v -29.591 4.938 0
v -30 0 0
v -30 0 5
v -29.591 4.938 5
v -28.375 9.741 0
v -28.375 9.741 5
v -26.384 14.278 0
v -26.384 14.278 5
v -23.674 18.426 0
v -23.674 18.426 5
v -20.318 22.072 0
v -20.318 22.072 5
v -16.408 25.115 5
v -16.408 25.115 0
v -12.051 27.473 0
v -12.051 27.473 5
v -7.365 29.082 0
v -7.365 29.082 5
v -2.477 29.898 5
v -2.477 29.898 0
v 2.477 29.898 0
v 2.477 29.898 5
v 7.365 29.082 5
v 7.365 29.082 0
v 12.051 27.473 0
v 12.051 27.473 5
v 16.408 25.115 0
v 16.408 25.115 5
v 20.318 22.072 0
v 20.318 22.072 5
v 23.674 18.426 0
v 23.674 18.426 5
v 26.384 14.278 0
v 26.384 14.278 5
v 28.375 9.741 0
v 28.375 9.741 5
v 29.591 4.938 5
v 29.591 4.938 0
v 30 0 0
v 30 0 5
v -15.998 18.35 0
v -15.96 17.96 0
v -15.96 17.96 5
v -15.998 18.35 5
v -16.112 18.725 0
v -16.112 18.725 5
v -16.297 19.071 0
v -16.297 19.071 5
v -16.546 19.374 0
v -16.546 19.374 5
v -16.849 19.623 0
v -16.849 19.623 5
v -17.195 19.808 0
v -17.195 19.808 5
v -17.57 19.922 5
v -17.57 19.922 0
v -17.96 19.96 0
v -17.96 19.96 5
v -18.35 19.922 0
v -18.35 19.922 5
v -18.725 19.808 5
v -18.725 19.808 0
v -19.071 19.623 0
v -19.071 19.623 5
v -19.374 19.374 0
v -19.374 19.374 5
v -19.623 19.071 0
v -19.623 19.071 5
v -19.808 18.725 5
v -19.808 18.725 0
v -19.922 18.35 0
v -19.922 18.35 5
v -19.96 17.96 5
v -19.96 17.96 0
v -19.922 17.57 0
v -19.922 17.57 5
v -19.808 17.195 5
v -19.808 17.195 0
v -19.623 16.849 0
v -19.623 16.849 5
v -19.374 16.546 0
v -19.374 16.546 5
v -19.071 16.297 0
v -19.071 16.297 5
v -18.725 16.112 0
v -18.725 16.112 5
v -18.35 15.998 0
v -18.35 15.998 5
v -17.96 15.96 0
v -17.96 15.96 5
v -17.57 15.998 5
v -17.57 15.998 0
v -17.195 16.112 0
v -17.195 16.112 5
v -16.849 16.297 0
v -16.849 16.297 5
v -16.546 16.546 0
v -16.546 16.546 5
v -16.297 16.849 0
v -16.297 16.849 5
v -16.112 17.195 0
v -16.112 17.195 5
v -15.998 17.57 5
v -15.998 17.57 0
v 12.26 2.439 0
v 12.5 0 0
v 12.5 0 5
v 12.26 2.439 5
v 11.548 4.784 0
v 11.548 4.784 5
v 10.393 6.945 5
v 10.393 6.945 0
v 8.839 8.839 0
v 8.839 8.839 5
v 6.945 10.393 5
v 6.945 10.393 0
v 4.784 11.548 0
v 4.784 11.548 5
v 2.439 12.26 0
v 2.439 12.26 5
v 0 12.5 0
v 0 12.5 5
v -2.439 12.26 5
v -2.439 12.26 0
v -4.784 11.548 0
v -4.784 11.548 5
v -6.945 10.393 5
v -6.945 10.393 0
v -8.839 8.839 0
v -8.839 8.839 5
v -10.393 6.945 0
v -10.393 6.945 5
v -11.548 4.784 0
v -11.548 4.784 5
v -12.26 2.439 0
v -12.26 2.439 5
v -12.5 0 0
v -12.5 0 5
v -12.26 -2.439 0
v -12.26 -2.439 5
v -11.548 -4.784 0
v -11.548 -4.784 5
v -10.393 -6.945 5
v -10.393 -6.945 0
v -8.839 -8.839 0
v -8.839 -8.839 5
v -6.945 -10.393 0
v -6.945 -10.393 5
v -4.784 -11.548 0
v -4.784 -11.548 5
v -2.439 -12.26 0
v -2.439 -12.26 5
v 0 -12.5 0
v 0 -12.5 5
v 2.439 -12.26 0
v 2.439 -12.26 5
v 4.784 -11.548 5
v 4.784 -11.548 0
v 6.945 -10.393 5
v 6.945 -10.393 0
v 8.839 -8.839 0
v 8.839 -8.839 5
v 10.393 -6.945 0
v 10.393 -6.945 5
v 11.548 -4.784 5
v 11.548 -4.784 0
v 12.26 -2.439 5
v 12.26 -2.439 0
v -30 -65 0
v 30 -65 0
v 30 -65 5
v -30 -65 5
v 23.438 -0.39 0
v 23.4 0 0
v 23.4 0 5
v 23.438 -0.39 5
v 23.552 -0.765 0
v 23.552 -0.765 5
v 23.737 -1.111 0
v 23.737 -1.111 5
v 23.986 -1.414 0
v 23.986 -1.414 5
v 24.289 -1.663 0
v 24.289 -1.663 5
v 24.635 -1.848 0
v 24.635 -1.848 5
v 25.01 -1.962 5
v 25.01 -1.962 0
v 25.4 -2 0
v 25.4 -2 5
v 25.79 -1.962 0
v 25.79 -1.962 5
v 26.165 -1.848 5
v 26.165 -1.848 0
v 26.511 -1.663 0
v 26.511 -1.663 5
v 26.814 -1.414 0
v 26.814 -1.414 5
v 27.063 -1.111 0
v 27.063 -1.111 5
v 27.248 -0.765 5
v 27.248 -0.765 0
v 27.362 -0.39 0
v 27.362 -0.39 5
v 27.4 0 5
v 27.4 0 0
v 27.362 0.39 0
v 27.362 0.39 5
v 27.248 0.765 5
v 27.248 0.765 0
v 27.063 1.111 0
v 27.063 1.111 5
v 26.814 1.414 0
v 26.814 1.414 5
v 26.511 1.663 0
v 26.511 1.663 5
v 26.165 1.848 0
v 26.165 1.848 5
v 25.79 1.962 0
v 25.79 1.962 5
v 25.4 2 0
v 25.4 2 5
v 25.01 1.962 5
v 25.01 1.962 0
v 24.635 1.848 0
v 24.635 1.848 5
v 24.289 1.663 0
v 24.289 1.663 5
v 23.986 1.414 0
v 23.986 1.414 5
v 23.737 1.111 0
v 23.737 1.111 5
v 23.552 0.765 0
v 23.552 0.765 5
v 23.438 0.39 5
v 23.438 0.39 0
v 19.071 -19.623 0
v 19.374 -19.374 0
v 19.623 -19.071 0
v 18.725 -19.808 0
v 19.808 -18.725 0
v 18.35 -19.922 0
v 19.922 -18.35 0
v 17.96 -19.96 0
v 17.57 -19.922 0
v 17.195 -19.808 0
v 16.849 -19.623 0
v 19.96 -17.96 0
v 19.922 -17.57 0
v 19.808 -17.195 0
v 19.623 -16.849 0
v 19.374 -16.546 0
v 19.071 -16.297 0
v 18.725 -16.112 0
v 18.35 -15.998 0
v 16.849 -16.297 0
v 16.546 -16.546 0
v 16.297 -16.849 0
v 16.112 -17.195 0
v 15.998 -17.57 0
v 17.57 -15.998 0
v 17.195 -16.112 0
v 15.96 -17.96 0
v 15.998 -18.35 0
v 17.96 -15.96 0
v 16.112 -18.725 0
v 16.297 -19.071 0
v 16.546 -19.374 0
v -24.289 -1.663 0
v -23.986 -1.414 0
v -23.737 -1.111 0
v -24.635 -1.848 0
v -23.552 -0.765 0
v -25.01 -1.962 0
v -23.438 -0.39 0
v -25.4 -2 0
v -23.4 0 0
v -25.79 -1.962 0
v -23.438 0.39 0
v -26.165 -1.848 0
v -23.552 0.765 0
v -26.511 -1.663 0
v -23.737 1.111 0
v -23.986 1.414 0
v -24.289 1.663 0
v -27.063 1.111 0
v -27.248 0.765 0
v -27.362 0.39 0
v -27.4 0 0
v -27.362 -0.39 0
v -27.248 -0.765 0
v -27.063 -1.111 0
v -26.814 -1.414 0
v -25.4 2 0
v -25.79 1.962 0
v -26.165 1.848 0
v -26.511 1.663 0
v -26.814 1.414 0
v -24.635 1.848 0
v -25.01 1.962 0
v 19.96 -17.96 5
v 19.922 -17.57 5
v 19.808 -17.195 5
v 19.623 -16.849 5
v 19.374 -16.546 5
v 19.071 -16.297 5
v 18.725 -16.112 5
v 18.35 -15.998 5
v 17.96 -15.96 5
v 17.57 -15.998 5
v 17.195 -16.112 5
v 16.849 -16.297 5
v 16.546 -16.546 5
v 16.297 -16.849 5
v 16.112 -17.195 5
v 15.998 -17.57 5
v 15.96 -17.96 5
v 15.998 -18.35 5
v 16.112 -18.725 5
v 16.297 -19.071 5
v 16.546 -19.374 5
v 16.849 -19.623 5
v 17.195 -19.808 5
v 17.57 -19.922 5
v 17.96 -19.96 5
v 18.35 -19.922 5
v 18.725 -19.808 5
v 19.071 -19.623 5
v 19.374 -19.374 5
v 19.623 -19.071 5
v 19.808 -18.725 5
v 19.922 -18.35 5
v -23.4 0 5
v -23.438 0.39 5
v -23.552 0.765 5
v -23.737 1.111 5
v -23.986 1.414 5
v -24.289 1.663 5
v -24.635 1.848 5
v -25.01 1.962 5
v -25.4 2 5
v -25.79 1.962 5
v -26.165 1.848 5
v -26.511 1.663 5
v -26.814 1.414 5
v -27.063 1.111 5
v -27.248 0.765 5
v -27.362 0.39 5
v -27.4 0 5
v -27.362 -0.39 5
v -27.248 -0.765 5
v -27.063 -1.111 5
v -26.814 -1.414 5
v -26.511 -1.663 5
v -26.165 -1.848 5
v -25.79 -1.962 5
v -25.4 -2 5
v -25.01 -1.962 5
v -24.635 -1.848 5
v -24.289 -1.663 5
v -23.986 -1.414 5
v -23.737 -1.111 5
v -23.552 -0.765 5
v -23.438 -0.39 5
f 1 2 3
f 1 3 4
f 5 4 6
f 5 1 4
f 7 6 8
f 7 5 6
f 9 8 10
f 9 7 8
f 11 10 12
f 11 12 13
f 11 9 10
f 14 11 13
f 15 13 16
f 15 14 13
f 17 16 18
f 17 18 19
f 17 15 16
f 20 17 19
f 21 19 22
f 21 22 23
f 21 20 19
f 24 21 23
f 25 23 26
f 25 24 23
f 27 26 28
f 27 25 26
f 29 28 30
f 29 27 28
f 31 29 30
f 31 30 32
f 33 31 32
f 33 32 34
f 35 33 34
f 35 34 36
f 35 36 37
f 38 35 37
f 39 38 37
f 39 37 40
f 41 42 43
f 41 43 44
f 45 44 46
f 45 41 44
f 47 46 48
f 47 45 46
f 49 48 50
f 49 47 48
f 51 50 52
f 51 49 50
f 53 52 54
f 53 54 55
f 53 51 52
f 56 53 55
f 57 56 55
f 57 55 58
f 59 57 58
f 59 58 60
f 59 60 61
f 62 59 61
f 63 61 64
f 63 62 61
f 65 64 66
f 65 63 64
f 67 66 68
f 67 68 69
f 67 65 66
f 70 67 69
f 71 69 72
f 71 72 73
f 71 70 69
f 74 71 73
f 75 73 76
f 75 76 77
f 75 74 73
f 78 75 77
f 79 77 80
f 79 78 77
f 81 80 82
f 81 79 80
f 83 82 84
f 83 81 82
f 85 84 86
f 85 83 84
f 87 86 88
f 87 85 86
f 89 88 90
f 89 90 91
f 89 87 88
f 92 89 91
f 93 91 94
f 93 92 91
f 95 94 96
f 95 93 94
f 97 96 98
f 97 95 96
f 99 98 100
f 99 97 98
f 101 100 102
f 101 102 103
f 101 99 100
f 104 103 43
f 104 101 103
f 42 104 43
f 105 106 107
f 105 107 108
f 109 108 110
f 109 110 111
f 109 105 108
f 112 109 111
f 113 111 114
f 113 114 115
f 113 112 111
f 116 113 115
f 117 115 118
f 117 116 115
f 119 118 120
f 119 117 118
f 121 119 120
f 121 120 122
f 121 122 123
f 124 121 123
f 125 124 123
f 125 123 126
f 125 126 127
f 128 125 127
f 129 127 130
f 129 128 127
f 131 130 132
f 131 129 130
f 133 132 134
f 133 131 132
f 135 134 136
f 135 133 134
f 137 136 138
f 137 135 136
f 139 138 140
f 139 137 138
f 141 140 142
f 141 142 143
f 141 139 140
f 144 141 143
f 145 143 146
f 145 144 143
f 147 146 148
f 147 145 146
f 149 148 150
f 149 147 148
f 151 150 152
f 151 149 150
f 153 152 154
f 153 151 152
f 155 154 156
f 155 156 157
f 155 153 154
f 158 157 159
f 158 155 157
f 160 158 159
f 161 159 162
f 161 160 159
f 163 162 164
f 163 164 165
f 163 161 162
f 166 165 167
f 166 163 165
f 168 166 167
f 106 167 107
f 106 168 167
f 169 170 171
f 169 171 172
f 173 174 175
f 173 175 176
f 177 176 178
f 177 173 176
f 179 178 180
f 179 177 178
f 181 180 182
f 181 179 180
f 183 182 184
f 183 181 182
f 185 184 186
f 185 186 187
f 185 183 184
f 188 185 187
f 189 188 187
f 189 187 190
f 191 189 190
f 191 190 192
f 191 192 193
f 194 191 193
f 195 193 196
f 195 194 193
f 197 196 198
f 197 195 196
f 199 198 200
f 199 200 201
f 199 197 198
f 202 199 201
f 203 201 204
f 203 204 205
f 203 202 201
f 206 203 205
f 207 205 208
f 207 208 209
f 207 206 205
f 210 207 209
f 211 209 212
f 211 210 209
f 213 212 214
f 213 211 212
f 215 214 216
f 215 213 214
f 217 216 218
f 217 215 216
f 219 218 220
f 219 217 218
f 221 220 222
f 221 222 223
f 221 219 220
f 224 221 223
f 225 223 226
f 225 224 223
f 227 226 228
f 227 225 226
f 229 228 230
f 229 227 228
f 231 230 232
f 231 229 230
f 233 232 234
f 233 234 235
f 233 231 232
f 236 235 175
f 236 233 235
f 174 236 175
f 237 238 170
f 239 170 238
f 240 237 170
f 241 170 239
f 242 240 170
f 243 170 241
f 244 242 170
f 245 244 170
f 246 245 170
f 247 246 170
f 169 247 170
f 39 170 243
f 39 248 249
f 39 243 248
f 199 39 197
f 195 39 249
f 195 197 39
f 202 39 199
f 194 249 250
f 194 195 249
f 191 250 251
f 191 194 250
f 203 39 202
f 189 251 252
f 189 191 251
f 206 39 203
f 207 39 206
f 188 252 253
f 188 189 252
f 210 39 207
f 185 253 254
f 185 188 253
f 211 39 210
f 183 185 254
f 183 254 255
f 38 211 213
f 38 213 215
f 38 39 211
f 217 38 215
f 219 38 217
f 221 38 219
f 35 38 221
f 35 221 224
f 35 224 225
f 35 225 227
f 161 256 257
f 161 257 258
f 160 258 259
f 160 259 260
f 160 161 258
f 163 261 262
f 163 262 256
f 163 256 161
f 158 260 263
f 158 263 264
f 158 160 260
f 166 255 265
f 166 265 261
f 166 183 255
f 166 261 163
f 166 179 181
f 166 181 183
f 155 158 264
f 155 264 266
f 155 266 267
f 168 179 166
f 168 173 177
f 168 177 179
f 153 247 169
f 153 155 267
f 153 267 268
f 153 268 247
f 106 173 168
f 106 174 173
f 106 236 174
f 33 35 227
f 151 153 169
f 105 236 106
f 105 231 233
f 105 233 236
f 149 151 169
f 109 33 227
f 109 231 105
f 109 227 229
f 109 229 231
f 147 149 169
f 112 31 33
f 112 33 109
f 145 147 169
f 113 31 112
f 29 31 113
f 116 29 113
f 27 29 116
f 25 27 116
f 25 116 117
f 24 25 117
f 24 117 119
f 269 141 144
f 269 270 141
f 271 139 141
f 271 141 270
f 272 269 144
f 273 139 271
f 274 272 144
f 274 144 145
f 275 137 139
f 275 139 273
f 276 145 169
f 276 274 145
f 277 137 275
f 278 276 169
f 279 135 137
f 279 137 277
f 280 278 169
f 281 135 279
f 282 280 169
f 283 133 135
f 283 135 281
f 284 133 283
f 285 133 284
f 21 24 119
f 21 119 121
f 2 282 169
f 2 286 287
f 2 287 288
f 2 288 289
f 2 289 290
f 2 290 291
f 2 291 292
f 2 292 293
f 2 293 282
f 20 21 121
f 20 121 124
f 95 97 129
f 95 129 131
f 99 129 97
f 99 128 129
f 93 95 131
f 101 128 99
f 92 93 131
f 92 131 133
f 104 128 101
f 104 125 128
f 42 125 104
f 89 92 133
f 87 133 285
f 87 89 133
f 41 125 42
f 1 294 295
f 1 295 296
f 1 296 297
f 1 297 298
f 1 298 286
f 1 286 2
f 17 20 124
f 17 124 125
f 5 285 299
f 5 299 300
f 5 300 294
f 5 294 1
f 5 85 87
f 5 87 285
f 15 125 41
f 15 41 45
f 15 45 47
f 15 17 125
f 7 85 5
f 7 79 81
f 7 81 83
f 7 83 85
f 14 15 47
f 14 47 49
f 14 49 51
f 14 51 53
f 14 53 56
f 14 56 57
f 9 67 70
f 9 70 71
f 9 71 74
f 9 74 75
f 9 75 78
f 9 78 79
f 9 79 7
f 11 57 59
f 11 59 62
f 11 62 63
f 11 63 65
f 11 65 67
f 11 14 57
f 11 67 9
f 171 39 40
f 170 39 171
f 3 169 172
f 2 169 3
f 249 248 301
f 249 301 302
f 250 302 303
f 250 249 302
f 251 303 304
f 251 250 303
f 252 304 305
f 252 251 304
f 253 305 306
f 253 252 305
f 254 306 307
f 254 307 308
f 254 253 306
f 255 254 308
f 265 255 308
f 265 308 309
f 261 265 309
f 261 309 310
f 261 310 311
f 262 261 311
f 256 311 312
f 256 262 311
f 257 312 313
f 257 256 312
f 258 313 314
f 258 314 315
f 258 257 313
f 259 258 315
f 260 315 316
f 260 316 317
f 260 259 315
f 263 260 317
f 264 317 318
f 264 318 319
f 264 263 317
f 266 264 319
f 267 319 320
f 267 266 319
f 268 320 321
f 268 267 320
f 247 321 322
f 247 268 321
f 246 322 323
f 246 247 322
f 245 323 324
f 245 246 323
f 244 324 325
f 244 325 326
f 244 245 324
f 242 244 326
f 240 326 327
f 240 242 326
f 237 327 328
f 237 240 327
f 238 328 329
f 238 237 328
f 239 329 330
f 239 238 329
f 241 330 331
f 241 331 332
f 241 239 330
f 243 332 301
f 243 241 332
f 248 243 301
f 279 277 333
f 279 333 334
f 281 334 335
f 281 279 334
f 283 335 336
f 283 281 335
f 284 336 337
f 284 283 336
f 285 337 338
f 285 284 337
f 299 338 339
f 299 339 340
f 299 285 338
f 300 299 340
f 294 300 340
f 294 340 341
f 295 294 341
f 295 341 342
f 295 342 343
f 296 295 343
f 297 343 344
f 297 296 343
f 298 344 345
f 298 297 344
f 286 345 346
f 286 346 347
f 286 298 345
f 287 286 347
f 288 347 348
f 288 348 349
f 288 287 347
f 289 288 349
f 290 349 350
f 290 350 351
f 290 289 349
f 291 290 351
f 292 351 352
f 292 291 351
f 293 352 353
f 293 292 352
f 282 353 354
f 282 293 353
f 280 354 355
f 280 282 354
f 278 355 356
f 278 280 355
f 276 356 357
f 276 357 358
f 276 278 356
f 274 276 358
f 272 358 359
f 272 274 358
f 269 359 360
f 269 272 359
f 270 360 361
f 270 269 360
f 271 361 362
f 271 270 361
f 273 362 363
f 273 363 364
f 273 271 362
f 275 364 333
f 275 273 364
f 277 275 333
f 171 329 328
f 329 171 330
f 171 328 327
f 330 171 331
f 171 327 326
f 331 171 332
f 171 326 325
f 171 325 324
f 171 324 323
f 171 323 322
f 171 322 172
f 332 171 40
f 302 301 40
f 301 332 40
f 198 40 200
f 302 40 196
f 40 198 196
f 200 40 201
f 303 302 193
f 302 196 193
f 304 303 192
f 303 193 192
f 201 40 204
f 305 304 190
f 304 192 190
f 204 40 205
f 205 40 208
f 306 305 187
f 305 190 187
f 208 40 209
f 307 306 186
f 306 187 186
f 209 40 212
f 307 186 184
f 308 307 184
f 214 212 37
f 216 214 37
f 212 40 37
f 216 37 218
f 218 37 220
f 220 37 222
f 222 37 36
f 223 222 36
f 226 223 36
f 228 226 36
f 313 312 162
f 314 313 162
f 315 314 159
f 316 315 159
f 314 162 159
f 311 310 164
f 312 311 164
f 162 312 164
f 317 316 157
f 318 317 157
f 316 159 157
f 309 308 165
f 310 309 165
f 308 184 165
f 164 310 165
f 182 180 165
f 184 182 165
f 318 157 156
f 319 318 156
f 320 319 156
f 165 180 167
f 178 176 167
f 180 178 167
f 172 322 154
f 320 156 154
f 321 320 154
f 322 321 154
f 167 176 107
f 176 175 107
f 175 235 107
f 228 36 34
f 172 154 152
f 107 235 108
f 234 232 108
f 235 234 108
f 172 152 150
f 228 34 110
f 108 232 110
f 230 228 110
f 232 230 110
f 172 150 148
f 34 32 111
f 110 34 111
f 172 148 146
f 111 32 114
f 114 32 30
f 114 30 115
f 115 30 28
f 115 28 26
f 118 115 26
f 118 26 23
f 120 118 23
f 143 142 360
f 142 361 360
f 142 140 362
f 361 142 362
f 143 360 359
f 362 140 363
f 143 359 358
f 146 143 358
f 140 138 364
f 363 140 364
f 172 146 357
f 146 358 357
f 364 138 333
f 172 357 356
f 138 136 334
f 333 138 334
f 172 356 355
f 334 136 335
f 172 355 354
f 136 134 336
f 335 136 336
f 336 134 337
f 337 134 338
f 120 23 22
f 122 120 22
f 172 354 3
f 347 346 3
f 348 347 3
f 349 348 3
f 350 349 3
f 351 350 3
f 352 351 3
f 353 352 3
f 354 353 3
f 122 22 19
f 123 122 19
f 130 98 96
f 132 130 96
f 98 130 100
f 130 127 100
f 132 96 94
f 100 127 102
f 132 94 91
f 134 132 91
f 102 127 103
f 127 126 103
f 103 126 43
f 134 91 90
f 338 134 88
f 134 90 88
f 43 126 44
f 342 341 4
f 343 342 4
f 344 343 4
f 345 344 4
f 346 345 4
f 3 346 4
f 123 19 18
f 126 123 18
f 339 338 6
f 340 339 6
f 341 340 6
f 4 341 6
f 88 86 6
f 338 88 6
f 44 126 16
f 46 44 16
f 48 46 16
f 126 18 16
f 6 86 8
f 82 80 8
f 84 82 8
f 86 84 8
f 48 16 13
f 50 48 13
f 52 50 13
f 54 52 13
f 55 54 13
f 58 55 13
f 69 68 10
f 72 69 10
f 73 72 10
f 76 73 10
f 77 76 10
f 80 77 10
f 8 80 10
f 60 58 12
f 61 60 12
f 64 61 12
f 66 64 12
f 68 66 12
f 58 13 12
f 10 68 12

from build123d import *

# Parameters (mm, degrees)
SKETCH_1_R      = 2
SKETCH_1_R_2    = 12.5
EXTRUDE_1_DEPTH = 5


with BuildPart() as part:
    # 草图1 → 凸台-拉伸1 (new body)
    with BuildSketch(Plane.XY):
        with BuildLine():
            Line((30, -65), (-30, -65))
            Line((-30, -65), (-30, 0))
            ThreePointArc((-30, 0), (0, 30), (30, 0))
            Line((30, 0), (30, -65))
        make_face()
        with Locations((-17.96, 17.96)):
            Circle(SKETCH_1_R, mode=Mode.SUBTRACT)
        with Locations((-25.4, 0)):
            Circle(SKETCH_1_R, mode=Mode.SUBTRACT)
        with Locations(Location((25.4, 0, 0), (0, 0, 180))):
            Circle(SKETCH_1_R, mode=Mode.SUBTRACT)
        with Locations((17.96, -17.96)):
            Circle(SKETCH_1_R, mode=Mode.SUBTRACT)
        Circle(SKETCH_1_R_2, mode=Mode.SUBTRACT)
    extrude(amount=EXTRUDE_1_DEPTH)


solid = part.part
